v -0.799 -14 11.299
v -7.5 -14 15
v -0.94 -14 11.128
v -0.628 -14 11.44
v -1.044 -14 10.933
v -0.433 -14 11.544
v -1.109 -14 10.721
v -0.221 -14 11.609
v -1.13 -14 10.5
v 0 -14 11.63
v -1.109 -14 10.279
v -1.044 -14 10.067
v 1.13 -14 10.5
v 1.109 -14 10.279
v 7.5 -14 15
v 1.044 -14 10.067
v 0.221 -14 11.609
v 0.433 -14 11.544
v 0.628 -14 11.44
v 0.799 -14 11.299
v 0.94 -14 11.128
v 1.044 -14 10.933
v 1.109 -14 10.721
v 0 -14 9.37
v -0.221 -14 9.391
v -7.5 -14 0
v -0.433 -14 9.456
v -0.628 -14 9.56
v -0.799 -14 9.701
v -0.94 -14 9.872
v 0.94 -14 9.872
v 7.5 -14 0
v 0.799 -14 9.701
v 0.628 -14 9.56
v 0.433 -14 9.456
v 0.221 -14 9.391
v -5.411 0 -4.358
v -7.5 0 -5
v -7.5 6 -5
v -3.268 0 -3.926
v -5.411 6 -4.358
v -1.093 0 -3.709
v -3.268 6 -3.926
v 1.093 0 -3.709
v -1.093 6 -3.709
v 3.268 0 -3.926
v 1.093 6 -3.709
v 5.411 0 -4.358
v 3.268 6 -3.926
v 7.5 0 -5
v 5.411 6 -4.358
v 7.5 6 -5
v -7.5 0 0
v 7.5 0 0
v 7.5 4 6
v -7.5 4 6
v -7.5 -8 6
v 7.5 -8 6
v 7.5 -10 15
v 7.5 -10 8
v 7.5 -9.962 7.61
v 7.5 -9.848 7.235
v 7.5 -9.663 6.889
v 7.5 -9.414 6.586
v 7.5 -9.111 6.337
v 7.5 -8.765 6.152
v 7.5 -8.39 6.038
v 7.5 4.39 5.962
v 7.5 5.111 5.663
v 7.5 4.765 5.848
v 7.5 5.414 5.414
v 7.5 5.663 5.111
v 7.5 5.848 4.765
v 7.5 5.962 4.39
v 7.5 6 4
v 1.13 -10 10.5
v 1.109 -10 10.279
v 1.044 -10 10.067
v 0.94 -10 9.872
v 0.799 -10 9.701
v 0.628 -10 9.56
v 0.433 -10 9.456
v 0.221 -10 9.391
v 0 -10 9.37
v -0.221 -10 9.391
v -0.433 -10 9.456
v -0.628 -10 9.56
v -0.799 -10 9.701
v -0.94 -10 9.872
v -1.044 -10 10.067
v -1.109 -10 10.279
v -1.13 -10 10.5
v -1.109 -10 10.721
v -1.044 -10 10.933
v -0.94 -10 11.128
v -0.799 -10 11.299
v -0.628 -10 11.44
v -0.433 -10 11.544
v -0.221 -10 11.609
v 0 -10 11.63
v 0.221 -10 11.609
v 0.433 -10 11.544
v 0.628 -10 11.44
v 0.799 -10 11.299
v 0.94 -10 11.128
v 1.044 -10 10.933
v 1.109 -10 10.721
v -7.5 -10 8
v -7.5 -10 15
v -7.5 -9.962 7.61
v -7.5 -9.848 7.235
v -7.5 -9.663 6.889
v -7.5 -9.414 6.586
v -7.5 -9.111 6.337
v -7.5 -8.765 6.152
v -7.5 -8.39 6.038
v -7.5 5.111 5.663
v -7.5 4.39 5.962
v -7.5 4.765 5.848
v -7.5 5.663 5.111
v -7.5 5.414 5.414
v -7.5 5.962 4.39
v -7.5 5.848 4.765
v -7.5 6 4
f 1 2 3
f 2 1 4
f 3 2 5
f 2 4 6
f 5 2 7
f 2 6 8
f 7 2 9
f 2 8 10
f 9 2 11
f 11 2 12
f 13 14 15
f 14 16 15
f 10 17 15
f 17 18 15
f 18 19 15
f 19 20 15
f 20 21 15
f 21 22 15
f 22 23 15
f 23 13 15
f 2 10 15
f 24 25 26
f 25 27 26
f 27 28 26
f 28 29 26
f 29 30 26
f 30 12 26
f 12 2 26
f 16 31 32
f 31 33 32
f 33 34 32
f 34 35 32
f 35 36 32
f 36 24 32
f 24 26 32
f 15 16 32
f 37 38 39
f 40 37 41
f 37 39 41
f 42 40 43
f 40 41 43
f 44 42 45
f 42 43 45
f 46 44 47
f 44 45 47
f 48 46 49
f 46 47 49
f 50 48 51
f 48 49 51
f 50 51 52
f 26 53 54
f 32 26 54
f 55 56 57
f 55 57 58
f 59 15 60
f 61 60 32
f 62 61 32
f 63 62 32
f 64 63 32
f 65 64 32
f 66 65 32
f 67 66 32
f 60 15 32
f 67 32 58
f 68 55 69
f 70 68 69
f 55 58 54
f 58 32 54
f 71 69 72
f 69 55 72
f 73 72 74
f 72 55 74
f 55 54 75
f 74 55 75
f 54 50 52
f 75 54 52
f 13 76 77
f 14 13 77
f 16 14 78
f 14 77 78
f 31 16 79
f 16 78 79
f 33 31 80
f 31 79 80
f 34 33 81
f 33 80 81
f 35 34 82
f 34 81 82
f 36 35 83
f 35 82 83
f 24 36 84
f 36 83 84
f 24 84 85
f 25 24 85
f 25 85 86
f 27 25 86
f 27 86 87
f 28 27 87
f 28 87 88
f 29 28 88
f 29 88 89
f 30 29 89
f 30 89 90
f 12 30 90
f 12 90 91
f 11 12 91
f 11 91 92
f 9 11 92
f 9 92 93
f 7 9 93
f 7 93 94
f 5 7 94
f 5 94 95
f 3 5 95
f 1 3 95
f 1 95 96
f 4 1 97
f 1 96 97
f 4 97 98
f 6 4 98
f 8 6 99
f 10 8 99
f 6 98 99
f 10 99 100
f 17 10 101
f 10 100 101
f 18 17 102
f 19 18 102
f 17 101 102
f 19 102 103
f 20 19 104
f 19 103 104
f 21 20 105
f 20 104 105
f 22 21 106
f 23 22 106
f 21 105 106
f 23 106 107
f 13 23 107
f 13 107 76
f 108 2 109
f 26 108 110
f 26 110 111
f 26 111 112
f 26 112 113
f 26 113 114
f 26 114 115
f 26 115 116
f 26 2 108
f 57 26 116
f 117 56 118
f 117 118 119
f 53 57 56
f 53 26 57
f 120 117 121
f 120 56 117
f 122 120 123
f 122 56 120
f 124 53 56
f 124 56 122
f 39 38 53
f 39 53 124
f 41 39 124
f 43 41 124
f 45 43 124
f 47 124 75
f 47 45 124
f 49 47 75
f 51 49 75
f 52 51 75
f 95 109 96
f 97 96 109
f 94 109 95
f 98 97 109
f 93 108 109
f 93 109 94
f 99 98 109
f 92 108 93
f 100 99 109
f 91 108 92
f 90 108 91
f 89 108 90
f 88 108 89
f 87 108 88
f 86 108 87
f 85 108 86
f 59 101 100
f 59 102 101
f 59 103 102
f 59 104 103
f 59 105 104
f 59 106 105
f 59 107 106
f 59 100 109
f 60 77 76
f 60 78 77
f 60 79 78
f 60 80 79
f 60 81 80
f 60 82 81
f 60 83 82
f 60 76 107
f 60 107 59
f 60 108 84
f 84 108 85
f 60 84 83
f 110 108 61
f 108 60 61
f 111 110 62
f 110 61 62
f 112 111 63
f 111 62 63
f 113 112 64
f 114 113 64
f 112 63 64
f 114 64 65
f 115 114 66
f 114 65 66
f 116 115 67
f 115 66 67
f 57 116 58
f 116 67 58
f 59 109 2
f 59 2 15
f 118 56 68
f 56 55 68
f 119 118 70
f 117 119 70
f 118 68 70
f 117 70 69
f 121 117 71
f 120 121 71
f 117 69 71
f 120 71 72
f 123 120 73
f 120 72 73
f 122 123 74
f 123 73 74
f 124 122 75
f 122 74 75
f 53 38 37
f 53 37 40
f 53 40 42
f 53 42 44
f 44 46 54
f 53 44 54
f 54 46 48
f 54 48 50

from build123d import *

# Parameters (mm, degrees)
SKETCH1_W                 = 15
SKETCH1_H                 = 10
BOSS_EXTRUDE1_DEPTH       = 6
SKETCH2_R                 = 22
CUT_EXTRUDE1_DEPTH        = 9
SKETCH3_W                 = 15
SKETCH3_H                 = 6
BOSS_EXTRUDE2_DEPTH       = 20
SKETCH4_W                 = 15
SKETCH4_H                 = 4
BOSS_EXTRUDE3_DEPTH       = 9
F_4_40_TAPPED_HOLE2_D     = 2.2606
F_4_40_TAPPED_HOLE2_DEPTH = 7.6
F_4_40_TAPPED_HOLE2_TIP   = 0.679152758
FILLET2_R                 = 2


with BuildPart() as part:
    # Sketch1 → Boss-Extrude1 (new body)
    with BuildSketch(Plane(origin=(0, 0, 0), x_dir=(1, 0, 0), z_dir=(0, 1, 0))):
        Rectangle(SKETCH1_W, SKETCH1_H)
    extrude(amount=BOSS_EXTRUDE1_DEPTH)

    # Sketch2 → Cut-Extrude1 (cut)
    with BuildSketch(Plane(origin=(0, 6, 0), x_dir=(1, 0, 0), z_dir=(0, 1, 0))):
        with Locations((0, 25.68211788)):
            Circle(SKETCH2_R)
    extrude(amount=-CUT_EXTRUDE1_DEPTH, mode=Mode.SUBTRACT)

    # Sketch3 → Boss-Extrude2 (add)
    with BuildSketch(Plane(origin=(0, 6, 0), x_dir=(1, 0, 0), z_dir=(0, 1, 0))):
        with Locations((0, -3)):
            Rectangle(SKETCH3_W, SKETCH3_H)
    extrude(amount=-BOSS_EXTRUDE2_DEPTH)

    # Sketch4 → Boss-Extrude3 (add)
    with BuildSketch(Plane.XY.offset(6)):
        with Locations((0, -12)):
            Rectangle(SKETCH4_W, SKETCH4_H)
    extrude(amount=BOSS_EXTRUDE3_DEPTH)

    # #4-40 Tapped Hole2
    with Locations(Plane(origin=(0, -14, 0), x_dir=(-1, 0, 0), z_dir=(0, -1, 0))):
        with Locations((0, -10.5)):
            Hole(F_4_40_TAPPED_HOLE2_D / 2, depth=F_4_40_TAPPED_HOLE2_DEPTH)
            with Locations((0, 0, -(F_4_40_TAPPED_HOLE2_DEPTH + F_4_40_TAPPED_HOLE2_TIP / 2))):  # 118° drill point
                Cone(0, F_4_40_TAPPED_HOLE2_D / 2, F_4_40_TAPPED_HOLE2_TIP, mode=Mode.SUBTRACT)

    # Fillet2
    fillet2_edges = [part.edges().sort_by_distance(p)[0] for p in [
        (0, 6, 6),
        (0, -10, 6),
    ]]
    fillet(fillet2_edges, radius=FILLET2_R)


solid = part.part
